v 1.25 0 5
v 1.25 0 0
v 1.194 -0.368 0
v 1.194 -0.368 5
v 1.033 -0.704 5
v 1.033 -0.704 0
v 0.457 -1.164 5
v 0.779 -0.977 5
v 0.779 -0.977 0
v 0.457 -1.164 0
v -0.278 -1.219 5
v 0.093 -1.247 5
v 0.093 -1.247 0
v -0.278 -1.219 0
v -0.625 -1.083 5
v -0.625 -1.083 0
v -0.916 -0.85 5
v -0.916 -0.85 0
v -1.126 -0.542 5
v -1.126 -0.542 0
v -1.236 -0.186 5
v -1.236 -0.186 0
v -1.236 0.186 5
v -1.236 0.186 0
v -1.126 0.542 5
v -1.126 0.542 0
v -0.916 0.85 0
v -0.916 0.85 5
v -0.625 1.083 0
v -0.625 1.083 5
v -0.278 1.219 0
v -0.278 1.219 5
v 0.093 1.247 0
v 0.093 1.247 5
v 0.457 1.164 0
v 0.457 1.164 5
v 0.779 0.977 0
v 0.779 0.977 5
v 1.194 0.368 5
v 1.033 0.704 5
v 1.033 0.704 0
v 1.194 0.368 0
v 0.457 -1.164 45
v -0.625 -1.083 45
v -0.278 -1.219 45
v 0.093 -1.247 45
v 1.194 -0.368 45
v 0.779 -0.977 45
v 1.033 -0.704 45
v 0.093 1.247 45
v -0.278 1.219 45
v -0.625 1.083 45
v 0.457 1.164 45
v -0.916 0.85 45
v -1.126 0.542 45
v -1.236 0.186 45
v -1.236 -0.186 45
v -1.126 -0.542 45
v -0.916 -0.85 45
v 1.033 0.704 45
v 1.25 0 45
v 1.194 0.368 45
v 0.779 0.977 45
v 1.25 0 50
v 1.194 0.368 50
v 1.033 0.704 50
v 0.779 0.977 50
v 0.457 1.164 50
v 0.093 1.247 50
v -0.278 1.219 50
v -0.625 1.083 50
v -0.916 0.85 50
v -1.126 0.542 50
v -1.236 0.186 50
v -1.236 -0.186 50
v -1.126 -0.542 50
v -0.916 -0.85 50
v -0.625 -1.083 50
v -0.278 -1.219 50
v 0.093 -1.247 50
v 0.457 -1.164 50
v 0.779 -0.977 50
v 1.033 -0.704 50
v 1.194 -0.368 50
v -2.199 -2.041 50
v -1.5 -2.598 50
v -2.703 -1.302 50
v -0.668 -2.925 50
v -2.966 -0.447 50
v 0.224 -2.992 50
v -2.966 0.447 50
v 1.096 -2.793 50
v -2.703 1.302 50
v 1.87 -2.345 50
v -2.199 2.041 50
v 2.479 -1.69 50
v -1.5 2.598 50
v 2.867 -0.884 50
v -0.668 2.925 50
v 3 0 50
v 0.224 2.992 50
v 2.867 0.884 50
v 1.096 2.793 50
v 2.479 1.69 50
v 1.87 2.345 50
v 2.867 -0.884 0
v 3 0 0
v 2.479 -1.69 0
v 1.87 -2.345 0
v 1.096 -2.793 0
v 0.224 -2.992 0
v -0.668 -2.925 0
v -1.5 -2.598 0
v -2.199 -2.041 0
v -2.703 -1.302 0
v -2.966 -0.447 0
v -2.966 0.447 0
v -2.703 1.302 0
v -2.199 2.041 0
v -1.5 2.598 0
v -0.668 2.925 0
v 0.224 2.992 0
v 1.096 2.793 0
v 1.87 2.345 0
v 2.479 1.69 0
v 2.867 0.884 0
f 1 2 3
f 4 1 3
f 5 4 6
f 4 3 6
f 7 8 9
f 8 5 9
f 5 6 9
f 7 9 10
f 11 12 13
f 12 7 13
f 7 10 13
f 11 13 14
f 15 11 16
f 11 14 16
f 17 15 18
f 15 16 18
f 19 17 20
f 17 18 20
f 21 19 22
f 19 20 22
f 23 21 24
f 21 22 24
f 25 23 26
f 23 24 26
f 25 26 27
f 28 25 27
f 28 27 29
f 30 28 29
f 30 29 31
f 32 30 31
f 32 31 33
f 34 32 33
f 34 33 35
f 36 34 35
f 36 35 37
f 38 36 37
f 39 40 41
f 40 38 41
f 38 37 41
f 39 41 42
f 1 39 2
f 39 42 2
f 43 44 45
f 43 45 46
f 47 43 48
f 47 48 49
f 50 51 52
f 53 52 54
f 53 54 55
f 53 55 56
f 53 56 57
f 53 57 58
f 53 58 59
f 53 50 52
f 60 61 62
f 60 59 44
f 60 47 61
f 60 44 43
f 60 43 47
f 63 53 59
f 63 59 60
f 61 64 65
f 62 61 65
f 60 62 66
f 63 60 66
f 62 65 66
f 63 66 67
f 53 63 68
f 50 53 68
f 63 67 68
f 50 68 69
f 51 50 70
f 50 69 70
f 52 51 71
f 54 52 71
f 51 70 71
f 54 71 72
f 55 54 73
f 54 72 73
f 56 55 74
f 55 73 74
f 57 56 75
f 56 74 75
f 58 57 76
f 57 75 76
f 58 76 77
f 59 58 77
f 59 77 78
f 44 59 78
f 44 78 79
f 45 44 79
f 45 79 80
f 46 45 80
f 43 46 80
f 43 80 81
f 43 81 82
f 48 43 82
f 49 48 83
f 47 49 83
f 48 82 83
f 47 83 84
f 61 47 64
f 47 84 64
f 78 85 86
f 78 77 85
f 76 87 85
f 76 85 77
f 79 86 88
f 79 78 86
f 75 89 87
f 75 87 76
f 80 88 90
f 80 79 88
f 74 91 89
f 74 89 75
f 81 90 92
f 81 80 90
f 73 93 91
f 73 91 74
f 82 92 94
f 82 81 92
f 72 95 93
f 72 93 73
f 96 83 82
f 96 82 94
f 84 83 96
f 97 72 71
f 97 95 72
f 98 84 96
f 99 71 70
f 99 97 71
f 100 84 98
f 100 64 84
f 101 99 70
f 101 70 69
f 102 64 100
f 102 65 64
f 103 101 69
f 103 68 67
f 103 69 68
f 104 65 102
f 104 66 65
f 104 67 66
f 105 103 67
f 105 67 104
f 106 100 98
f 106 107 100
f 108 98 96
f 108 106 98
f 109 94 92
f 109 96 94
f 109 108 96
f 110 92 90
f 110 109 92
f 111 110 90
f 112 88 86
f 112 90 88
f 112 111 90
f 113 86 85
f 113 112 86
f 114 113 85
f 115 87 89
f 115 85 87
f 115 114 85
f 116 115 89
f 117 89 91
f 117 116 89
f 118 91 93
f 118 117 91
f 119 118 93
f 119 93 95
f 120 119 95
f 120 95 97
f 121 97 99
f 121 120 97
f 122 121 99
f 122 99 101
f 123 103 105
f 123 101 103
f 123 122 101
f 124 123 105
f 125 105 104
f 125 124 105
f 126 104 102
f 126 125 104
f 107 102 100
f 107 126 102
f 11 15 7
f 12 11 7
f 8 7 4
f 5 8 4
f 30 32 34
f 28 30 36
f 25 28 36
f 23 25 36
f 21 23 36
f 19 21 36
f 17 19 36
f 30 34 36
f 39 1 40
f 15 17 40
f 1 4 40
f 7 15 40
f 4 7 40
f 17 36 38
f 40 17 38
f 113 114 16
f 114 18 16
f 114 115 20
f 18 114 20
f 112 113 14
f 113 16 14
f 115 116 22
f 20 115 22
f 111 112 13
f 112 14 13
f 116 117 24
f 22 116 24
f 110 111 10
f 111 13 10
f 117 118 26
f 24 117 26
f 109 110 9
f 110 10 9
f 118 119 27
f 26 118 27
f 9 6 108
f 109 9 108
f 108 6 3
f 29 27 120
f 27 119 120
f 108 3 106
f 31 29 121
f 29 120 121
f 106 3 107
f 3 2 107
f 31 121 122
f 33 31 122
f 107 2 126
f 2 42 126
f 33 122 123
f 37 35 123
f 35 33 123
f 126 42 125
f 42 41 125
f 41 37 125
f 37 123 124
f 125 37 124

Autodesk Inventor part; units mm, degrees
ref_plane "YZ Plane" through (0, 0, 0) normal (1, 0, 0) x (0, 1, 0)
ref_plane "XZ Plane" through (0, 0, 0) normal (0, 1, 0) x (-1, 0, 0)
ref_plane "XY Plane" through (0, 0, 0) normal (0, 0, 1) x (1, 0, 0)
sketch "スケッチ1" plane through (0, 0, 0) normal (0, 0, 1) x (1, 0, 0)
  circle A0 centre (0, 0) radius 3
  circle A1 centre (0, 0) radius 1.25
  dimension "d0" = 6
  dimension "d1" = 2.5
extrude "押し出し1" add sketch "スケッチ1" along normal blind 50 contours A0 | A1
sketch "スケッチ2" plane through (0, 0, 50) normal (0, 0, 1) x (1, 0, 0)
  circle A0 centre (0, 0) radius 3 projected
  circle A1 centre (0, 0) radius 1.25
  dimension "d4" = 2.5
extrude "押し出し2" cut sketch "スケッチ2" against normal blind 5 contours A1
extrude "押し出し3" cut sketch "スケッチ1" along normal blind 5 contours A1
properties part number "50mm" material "アルミニウム 2014-T4"
